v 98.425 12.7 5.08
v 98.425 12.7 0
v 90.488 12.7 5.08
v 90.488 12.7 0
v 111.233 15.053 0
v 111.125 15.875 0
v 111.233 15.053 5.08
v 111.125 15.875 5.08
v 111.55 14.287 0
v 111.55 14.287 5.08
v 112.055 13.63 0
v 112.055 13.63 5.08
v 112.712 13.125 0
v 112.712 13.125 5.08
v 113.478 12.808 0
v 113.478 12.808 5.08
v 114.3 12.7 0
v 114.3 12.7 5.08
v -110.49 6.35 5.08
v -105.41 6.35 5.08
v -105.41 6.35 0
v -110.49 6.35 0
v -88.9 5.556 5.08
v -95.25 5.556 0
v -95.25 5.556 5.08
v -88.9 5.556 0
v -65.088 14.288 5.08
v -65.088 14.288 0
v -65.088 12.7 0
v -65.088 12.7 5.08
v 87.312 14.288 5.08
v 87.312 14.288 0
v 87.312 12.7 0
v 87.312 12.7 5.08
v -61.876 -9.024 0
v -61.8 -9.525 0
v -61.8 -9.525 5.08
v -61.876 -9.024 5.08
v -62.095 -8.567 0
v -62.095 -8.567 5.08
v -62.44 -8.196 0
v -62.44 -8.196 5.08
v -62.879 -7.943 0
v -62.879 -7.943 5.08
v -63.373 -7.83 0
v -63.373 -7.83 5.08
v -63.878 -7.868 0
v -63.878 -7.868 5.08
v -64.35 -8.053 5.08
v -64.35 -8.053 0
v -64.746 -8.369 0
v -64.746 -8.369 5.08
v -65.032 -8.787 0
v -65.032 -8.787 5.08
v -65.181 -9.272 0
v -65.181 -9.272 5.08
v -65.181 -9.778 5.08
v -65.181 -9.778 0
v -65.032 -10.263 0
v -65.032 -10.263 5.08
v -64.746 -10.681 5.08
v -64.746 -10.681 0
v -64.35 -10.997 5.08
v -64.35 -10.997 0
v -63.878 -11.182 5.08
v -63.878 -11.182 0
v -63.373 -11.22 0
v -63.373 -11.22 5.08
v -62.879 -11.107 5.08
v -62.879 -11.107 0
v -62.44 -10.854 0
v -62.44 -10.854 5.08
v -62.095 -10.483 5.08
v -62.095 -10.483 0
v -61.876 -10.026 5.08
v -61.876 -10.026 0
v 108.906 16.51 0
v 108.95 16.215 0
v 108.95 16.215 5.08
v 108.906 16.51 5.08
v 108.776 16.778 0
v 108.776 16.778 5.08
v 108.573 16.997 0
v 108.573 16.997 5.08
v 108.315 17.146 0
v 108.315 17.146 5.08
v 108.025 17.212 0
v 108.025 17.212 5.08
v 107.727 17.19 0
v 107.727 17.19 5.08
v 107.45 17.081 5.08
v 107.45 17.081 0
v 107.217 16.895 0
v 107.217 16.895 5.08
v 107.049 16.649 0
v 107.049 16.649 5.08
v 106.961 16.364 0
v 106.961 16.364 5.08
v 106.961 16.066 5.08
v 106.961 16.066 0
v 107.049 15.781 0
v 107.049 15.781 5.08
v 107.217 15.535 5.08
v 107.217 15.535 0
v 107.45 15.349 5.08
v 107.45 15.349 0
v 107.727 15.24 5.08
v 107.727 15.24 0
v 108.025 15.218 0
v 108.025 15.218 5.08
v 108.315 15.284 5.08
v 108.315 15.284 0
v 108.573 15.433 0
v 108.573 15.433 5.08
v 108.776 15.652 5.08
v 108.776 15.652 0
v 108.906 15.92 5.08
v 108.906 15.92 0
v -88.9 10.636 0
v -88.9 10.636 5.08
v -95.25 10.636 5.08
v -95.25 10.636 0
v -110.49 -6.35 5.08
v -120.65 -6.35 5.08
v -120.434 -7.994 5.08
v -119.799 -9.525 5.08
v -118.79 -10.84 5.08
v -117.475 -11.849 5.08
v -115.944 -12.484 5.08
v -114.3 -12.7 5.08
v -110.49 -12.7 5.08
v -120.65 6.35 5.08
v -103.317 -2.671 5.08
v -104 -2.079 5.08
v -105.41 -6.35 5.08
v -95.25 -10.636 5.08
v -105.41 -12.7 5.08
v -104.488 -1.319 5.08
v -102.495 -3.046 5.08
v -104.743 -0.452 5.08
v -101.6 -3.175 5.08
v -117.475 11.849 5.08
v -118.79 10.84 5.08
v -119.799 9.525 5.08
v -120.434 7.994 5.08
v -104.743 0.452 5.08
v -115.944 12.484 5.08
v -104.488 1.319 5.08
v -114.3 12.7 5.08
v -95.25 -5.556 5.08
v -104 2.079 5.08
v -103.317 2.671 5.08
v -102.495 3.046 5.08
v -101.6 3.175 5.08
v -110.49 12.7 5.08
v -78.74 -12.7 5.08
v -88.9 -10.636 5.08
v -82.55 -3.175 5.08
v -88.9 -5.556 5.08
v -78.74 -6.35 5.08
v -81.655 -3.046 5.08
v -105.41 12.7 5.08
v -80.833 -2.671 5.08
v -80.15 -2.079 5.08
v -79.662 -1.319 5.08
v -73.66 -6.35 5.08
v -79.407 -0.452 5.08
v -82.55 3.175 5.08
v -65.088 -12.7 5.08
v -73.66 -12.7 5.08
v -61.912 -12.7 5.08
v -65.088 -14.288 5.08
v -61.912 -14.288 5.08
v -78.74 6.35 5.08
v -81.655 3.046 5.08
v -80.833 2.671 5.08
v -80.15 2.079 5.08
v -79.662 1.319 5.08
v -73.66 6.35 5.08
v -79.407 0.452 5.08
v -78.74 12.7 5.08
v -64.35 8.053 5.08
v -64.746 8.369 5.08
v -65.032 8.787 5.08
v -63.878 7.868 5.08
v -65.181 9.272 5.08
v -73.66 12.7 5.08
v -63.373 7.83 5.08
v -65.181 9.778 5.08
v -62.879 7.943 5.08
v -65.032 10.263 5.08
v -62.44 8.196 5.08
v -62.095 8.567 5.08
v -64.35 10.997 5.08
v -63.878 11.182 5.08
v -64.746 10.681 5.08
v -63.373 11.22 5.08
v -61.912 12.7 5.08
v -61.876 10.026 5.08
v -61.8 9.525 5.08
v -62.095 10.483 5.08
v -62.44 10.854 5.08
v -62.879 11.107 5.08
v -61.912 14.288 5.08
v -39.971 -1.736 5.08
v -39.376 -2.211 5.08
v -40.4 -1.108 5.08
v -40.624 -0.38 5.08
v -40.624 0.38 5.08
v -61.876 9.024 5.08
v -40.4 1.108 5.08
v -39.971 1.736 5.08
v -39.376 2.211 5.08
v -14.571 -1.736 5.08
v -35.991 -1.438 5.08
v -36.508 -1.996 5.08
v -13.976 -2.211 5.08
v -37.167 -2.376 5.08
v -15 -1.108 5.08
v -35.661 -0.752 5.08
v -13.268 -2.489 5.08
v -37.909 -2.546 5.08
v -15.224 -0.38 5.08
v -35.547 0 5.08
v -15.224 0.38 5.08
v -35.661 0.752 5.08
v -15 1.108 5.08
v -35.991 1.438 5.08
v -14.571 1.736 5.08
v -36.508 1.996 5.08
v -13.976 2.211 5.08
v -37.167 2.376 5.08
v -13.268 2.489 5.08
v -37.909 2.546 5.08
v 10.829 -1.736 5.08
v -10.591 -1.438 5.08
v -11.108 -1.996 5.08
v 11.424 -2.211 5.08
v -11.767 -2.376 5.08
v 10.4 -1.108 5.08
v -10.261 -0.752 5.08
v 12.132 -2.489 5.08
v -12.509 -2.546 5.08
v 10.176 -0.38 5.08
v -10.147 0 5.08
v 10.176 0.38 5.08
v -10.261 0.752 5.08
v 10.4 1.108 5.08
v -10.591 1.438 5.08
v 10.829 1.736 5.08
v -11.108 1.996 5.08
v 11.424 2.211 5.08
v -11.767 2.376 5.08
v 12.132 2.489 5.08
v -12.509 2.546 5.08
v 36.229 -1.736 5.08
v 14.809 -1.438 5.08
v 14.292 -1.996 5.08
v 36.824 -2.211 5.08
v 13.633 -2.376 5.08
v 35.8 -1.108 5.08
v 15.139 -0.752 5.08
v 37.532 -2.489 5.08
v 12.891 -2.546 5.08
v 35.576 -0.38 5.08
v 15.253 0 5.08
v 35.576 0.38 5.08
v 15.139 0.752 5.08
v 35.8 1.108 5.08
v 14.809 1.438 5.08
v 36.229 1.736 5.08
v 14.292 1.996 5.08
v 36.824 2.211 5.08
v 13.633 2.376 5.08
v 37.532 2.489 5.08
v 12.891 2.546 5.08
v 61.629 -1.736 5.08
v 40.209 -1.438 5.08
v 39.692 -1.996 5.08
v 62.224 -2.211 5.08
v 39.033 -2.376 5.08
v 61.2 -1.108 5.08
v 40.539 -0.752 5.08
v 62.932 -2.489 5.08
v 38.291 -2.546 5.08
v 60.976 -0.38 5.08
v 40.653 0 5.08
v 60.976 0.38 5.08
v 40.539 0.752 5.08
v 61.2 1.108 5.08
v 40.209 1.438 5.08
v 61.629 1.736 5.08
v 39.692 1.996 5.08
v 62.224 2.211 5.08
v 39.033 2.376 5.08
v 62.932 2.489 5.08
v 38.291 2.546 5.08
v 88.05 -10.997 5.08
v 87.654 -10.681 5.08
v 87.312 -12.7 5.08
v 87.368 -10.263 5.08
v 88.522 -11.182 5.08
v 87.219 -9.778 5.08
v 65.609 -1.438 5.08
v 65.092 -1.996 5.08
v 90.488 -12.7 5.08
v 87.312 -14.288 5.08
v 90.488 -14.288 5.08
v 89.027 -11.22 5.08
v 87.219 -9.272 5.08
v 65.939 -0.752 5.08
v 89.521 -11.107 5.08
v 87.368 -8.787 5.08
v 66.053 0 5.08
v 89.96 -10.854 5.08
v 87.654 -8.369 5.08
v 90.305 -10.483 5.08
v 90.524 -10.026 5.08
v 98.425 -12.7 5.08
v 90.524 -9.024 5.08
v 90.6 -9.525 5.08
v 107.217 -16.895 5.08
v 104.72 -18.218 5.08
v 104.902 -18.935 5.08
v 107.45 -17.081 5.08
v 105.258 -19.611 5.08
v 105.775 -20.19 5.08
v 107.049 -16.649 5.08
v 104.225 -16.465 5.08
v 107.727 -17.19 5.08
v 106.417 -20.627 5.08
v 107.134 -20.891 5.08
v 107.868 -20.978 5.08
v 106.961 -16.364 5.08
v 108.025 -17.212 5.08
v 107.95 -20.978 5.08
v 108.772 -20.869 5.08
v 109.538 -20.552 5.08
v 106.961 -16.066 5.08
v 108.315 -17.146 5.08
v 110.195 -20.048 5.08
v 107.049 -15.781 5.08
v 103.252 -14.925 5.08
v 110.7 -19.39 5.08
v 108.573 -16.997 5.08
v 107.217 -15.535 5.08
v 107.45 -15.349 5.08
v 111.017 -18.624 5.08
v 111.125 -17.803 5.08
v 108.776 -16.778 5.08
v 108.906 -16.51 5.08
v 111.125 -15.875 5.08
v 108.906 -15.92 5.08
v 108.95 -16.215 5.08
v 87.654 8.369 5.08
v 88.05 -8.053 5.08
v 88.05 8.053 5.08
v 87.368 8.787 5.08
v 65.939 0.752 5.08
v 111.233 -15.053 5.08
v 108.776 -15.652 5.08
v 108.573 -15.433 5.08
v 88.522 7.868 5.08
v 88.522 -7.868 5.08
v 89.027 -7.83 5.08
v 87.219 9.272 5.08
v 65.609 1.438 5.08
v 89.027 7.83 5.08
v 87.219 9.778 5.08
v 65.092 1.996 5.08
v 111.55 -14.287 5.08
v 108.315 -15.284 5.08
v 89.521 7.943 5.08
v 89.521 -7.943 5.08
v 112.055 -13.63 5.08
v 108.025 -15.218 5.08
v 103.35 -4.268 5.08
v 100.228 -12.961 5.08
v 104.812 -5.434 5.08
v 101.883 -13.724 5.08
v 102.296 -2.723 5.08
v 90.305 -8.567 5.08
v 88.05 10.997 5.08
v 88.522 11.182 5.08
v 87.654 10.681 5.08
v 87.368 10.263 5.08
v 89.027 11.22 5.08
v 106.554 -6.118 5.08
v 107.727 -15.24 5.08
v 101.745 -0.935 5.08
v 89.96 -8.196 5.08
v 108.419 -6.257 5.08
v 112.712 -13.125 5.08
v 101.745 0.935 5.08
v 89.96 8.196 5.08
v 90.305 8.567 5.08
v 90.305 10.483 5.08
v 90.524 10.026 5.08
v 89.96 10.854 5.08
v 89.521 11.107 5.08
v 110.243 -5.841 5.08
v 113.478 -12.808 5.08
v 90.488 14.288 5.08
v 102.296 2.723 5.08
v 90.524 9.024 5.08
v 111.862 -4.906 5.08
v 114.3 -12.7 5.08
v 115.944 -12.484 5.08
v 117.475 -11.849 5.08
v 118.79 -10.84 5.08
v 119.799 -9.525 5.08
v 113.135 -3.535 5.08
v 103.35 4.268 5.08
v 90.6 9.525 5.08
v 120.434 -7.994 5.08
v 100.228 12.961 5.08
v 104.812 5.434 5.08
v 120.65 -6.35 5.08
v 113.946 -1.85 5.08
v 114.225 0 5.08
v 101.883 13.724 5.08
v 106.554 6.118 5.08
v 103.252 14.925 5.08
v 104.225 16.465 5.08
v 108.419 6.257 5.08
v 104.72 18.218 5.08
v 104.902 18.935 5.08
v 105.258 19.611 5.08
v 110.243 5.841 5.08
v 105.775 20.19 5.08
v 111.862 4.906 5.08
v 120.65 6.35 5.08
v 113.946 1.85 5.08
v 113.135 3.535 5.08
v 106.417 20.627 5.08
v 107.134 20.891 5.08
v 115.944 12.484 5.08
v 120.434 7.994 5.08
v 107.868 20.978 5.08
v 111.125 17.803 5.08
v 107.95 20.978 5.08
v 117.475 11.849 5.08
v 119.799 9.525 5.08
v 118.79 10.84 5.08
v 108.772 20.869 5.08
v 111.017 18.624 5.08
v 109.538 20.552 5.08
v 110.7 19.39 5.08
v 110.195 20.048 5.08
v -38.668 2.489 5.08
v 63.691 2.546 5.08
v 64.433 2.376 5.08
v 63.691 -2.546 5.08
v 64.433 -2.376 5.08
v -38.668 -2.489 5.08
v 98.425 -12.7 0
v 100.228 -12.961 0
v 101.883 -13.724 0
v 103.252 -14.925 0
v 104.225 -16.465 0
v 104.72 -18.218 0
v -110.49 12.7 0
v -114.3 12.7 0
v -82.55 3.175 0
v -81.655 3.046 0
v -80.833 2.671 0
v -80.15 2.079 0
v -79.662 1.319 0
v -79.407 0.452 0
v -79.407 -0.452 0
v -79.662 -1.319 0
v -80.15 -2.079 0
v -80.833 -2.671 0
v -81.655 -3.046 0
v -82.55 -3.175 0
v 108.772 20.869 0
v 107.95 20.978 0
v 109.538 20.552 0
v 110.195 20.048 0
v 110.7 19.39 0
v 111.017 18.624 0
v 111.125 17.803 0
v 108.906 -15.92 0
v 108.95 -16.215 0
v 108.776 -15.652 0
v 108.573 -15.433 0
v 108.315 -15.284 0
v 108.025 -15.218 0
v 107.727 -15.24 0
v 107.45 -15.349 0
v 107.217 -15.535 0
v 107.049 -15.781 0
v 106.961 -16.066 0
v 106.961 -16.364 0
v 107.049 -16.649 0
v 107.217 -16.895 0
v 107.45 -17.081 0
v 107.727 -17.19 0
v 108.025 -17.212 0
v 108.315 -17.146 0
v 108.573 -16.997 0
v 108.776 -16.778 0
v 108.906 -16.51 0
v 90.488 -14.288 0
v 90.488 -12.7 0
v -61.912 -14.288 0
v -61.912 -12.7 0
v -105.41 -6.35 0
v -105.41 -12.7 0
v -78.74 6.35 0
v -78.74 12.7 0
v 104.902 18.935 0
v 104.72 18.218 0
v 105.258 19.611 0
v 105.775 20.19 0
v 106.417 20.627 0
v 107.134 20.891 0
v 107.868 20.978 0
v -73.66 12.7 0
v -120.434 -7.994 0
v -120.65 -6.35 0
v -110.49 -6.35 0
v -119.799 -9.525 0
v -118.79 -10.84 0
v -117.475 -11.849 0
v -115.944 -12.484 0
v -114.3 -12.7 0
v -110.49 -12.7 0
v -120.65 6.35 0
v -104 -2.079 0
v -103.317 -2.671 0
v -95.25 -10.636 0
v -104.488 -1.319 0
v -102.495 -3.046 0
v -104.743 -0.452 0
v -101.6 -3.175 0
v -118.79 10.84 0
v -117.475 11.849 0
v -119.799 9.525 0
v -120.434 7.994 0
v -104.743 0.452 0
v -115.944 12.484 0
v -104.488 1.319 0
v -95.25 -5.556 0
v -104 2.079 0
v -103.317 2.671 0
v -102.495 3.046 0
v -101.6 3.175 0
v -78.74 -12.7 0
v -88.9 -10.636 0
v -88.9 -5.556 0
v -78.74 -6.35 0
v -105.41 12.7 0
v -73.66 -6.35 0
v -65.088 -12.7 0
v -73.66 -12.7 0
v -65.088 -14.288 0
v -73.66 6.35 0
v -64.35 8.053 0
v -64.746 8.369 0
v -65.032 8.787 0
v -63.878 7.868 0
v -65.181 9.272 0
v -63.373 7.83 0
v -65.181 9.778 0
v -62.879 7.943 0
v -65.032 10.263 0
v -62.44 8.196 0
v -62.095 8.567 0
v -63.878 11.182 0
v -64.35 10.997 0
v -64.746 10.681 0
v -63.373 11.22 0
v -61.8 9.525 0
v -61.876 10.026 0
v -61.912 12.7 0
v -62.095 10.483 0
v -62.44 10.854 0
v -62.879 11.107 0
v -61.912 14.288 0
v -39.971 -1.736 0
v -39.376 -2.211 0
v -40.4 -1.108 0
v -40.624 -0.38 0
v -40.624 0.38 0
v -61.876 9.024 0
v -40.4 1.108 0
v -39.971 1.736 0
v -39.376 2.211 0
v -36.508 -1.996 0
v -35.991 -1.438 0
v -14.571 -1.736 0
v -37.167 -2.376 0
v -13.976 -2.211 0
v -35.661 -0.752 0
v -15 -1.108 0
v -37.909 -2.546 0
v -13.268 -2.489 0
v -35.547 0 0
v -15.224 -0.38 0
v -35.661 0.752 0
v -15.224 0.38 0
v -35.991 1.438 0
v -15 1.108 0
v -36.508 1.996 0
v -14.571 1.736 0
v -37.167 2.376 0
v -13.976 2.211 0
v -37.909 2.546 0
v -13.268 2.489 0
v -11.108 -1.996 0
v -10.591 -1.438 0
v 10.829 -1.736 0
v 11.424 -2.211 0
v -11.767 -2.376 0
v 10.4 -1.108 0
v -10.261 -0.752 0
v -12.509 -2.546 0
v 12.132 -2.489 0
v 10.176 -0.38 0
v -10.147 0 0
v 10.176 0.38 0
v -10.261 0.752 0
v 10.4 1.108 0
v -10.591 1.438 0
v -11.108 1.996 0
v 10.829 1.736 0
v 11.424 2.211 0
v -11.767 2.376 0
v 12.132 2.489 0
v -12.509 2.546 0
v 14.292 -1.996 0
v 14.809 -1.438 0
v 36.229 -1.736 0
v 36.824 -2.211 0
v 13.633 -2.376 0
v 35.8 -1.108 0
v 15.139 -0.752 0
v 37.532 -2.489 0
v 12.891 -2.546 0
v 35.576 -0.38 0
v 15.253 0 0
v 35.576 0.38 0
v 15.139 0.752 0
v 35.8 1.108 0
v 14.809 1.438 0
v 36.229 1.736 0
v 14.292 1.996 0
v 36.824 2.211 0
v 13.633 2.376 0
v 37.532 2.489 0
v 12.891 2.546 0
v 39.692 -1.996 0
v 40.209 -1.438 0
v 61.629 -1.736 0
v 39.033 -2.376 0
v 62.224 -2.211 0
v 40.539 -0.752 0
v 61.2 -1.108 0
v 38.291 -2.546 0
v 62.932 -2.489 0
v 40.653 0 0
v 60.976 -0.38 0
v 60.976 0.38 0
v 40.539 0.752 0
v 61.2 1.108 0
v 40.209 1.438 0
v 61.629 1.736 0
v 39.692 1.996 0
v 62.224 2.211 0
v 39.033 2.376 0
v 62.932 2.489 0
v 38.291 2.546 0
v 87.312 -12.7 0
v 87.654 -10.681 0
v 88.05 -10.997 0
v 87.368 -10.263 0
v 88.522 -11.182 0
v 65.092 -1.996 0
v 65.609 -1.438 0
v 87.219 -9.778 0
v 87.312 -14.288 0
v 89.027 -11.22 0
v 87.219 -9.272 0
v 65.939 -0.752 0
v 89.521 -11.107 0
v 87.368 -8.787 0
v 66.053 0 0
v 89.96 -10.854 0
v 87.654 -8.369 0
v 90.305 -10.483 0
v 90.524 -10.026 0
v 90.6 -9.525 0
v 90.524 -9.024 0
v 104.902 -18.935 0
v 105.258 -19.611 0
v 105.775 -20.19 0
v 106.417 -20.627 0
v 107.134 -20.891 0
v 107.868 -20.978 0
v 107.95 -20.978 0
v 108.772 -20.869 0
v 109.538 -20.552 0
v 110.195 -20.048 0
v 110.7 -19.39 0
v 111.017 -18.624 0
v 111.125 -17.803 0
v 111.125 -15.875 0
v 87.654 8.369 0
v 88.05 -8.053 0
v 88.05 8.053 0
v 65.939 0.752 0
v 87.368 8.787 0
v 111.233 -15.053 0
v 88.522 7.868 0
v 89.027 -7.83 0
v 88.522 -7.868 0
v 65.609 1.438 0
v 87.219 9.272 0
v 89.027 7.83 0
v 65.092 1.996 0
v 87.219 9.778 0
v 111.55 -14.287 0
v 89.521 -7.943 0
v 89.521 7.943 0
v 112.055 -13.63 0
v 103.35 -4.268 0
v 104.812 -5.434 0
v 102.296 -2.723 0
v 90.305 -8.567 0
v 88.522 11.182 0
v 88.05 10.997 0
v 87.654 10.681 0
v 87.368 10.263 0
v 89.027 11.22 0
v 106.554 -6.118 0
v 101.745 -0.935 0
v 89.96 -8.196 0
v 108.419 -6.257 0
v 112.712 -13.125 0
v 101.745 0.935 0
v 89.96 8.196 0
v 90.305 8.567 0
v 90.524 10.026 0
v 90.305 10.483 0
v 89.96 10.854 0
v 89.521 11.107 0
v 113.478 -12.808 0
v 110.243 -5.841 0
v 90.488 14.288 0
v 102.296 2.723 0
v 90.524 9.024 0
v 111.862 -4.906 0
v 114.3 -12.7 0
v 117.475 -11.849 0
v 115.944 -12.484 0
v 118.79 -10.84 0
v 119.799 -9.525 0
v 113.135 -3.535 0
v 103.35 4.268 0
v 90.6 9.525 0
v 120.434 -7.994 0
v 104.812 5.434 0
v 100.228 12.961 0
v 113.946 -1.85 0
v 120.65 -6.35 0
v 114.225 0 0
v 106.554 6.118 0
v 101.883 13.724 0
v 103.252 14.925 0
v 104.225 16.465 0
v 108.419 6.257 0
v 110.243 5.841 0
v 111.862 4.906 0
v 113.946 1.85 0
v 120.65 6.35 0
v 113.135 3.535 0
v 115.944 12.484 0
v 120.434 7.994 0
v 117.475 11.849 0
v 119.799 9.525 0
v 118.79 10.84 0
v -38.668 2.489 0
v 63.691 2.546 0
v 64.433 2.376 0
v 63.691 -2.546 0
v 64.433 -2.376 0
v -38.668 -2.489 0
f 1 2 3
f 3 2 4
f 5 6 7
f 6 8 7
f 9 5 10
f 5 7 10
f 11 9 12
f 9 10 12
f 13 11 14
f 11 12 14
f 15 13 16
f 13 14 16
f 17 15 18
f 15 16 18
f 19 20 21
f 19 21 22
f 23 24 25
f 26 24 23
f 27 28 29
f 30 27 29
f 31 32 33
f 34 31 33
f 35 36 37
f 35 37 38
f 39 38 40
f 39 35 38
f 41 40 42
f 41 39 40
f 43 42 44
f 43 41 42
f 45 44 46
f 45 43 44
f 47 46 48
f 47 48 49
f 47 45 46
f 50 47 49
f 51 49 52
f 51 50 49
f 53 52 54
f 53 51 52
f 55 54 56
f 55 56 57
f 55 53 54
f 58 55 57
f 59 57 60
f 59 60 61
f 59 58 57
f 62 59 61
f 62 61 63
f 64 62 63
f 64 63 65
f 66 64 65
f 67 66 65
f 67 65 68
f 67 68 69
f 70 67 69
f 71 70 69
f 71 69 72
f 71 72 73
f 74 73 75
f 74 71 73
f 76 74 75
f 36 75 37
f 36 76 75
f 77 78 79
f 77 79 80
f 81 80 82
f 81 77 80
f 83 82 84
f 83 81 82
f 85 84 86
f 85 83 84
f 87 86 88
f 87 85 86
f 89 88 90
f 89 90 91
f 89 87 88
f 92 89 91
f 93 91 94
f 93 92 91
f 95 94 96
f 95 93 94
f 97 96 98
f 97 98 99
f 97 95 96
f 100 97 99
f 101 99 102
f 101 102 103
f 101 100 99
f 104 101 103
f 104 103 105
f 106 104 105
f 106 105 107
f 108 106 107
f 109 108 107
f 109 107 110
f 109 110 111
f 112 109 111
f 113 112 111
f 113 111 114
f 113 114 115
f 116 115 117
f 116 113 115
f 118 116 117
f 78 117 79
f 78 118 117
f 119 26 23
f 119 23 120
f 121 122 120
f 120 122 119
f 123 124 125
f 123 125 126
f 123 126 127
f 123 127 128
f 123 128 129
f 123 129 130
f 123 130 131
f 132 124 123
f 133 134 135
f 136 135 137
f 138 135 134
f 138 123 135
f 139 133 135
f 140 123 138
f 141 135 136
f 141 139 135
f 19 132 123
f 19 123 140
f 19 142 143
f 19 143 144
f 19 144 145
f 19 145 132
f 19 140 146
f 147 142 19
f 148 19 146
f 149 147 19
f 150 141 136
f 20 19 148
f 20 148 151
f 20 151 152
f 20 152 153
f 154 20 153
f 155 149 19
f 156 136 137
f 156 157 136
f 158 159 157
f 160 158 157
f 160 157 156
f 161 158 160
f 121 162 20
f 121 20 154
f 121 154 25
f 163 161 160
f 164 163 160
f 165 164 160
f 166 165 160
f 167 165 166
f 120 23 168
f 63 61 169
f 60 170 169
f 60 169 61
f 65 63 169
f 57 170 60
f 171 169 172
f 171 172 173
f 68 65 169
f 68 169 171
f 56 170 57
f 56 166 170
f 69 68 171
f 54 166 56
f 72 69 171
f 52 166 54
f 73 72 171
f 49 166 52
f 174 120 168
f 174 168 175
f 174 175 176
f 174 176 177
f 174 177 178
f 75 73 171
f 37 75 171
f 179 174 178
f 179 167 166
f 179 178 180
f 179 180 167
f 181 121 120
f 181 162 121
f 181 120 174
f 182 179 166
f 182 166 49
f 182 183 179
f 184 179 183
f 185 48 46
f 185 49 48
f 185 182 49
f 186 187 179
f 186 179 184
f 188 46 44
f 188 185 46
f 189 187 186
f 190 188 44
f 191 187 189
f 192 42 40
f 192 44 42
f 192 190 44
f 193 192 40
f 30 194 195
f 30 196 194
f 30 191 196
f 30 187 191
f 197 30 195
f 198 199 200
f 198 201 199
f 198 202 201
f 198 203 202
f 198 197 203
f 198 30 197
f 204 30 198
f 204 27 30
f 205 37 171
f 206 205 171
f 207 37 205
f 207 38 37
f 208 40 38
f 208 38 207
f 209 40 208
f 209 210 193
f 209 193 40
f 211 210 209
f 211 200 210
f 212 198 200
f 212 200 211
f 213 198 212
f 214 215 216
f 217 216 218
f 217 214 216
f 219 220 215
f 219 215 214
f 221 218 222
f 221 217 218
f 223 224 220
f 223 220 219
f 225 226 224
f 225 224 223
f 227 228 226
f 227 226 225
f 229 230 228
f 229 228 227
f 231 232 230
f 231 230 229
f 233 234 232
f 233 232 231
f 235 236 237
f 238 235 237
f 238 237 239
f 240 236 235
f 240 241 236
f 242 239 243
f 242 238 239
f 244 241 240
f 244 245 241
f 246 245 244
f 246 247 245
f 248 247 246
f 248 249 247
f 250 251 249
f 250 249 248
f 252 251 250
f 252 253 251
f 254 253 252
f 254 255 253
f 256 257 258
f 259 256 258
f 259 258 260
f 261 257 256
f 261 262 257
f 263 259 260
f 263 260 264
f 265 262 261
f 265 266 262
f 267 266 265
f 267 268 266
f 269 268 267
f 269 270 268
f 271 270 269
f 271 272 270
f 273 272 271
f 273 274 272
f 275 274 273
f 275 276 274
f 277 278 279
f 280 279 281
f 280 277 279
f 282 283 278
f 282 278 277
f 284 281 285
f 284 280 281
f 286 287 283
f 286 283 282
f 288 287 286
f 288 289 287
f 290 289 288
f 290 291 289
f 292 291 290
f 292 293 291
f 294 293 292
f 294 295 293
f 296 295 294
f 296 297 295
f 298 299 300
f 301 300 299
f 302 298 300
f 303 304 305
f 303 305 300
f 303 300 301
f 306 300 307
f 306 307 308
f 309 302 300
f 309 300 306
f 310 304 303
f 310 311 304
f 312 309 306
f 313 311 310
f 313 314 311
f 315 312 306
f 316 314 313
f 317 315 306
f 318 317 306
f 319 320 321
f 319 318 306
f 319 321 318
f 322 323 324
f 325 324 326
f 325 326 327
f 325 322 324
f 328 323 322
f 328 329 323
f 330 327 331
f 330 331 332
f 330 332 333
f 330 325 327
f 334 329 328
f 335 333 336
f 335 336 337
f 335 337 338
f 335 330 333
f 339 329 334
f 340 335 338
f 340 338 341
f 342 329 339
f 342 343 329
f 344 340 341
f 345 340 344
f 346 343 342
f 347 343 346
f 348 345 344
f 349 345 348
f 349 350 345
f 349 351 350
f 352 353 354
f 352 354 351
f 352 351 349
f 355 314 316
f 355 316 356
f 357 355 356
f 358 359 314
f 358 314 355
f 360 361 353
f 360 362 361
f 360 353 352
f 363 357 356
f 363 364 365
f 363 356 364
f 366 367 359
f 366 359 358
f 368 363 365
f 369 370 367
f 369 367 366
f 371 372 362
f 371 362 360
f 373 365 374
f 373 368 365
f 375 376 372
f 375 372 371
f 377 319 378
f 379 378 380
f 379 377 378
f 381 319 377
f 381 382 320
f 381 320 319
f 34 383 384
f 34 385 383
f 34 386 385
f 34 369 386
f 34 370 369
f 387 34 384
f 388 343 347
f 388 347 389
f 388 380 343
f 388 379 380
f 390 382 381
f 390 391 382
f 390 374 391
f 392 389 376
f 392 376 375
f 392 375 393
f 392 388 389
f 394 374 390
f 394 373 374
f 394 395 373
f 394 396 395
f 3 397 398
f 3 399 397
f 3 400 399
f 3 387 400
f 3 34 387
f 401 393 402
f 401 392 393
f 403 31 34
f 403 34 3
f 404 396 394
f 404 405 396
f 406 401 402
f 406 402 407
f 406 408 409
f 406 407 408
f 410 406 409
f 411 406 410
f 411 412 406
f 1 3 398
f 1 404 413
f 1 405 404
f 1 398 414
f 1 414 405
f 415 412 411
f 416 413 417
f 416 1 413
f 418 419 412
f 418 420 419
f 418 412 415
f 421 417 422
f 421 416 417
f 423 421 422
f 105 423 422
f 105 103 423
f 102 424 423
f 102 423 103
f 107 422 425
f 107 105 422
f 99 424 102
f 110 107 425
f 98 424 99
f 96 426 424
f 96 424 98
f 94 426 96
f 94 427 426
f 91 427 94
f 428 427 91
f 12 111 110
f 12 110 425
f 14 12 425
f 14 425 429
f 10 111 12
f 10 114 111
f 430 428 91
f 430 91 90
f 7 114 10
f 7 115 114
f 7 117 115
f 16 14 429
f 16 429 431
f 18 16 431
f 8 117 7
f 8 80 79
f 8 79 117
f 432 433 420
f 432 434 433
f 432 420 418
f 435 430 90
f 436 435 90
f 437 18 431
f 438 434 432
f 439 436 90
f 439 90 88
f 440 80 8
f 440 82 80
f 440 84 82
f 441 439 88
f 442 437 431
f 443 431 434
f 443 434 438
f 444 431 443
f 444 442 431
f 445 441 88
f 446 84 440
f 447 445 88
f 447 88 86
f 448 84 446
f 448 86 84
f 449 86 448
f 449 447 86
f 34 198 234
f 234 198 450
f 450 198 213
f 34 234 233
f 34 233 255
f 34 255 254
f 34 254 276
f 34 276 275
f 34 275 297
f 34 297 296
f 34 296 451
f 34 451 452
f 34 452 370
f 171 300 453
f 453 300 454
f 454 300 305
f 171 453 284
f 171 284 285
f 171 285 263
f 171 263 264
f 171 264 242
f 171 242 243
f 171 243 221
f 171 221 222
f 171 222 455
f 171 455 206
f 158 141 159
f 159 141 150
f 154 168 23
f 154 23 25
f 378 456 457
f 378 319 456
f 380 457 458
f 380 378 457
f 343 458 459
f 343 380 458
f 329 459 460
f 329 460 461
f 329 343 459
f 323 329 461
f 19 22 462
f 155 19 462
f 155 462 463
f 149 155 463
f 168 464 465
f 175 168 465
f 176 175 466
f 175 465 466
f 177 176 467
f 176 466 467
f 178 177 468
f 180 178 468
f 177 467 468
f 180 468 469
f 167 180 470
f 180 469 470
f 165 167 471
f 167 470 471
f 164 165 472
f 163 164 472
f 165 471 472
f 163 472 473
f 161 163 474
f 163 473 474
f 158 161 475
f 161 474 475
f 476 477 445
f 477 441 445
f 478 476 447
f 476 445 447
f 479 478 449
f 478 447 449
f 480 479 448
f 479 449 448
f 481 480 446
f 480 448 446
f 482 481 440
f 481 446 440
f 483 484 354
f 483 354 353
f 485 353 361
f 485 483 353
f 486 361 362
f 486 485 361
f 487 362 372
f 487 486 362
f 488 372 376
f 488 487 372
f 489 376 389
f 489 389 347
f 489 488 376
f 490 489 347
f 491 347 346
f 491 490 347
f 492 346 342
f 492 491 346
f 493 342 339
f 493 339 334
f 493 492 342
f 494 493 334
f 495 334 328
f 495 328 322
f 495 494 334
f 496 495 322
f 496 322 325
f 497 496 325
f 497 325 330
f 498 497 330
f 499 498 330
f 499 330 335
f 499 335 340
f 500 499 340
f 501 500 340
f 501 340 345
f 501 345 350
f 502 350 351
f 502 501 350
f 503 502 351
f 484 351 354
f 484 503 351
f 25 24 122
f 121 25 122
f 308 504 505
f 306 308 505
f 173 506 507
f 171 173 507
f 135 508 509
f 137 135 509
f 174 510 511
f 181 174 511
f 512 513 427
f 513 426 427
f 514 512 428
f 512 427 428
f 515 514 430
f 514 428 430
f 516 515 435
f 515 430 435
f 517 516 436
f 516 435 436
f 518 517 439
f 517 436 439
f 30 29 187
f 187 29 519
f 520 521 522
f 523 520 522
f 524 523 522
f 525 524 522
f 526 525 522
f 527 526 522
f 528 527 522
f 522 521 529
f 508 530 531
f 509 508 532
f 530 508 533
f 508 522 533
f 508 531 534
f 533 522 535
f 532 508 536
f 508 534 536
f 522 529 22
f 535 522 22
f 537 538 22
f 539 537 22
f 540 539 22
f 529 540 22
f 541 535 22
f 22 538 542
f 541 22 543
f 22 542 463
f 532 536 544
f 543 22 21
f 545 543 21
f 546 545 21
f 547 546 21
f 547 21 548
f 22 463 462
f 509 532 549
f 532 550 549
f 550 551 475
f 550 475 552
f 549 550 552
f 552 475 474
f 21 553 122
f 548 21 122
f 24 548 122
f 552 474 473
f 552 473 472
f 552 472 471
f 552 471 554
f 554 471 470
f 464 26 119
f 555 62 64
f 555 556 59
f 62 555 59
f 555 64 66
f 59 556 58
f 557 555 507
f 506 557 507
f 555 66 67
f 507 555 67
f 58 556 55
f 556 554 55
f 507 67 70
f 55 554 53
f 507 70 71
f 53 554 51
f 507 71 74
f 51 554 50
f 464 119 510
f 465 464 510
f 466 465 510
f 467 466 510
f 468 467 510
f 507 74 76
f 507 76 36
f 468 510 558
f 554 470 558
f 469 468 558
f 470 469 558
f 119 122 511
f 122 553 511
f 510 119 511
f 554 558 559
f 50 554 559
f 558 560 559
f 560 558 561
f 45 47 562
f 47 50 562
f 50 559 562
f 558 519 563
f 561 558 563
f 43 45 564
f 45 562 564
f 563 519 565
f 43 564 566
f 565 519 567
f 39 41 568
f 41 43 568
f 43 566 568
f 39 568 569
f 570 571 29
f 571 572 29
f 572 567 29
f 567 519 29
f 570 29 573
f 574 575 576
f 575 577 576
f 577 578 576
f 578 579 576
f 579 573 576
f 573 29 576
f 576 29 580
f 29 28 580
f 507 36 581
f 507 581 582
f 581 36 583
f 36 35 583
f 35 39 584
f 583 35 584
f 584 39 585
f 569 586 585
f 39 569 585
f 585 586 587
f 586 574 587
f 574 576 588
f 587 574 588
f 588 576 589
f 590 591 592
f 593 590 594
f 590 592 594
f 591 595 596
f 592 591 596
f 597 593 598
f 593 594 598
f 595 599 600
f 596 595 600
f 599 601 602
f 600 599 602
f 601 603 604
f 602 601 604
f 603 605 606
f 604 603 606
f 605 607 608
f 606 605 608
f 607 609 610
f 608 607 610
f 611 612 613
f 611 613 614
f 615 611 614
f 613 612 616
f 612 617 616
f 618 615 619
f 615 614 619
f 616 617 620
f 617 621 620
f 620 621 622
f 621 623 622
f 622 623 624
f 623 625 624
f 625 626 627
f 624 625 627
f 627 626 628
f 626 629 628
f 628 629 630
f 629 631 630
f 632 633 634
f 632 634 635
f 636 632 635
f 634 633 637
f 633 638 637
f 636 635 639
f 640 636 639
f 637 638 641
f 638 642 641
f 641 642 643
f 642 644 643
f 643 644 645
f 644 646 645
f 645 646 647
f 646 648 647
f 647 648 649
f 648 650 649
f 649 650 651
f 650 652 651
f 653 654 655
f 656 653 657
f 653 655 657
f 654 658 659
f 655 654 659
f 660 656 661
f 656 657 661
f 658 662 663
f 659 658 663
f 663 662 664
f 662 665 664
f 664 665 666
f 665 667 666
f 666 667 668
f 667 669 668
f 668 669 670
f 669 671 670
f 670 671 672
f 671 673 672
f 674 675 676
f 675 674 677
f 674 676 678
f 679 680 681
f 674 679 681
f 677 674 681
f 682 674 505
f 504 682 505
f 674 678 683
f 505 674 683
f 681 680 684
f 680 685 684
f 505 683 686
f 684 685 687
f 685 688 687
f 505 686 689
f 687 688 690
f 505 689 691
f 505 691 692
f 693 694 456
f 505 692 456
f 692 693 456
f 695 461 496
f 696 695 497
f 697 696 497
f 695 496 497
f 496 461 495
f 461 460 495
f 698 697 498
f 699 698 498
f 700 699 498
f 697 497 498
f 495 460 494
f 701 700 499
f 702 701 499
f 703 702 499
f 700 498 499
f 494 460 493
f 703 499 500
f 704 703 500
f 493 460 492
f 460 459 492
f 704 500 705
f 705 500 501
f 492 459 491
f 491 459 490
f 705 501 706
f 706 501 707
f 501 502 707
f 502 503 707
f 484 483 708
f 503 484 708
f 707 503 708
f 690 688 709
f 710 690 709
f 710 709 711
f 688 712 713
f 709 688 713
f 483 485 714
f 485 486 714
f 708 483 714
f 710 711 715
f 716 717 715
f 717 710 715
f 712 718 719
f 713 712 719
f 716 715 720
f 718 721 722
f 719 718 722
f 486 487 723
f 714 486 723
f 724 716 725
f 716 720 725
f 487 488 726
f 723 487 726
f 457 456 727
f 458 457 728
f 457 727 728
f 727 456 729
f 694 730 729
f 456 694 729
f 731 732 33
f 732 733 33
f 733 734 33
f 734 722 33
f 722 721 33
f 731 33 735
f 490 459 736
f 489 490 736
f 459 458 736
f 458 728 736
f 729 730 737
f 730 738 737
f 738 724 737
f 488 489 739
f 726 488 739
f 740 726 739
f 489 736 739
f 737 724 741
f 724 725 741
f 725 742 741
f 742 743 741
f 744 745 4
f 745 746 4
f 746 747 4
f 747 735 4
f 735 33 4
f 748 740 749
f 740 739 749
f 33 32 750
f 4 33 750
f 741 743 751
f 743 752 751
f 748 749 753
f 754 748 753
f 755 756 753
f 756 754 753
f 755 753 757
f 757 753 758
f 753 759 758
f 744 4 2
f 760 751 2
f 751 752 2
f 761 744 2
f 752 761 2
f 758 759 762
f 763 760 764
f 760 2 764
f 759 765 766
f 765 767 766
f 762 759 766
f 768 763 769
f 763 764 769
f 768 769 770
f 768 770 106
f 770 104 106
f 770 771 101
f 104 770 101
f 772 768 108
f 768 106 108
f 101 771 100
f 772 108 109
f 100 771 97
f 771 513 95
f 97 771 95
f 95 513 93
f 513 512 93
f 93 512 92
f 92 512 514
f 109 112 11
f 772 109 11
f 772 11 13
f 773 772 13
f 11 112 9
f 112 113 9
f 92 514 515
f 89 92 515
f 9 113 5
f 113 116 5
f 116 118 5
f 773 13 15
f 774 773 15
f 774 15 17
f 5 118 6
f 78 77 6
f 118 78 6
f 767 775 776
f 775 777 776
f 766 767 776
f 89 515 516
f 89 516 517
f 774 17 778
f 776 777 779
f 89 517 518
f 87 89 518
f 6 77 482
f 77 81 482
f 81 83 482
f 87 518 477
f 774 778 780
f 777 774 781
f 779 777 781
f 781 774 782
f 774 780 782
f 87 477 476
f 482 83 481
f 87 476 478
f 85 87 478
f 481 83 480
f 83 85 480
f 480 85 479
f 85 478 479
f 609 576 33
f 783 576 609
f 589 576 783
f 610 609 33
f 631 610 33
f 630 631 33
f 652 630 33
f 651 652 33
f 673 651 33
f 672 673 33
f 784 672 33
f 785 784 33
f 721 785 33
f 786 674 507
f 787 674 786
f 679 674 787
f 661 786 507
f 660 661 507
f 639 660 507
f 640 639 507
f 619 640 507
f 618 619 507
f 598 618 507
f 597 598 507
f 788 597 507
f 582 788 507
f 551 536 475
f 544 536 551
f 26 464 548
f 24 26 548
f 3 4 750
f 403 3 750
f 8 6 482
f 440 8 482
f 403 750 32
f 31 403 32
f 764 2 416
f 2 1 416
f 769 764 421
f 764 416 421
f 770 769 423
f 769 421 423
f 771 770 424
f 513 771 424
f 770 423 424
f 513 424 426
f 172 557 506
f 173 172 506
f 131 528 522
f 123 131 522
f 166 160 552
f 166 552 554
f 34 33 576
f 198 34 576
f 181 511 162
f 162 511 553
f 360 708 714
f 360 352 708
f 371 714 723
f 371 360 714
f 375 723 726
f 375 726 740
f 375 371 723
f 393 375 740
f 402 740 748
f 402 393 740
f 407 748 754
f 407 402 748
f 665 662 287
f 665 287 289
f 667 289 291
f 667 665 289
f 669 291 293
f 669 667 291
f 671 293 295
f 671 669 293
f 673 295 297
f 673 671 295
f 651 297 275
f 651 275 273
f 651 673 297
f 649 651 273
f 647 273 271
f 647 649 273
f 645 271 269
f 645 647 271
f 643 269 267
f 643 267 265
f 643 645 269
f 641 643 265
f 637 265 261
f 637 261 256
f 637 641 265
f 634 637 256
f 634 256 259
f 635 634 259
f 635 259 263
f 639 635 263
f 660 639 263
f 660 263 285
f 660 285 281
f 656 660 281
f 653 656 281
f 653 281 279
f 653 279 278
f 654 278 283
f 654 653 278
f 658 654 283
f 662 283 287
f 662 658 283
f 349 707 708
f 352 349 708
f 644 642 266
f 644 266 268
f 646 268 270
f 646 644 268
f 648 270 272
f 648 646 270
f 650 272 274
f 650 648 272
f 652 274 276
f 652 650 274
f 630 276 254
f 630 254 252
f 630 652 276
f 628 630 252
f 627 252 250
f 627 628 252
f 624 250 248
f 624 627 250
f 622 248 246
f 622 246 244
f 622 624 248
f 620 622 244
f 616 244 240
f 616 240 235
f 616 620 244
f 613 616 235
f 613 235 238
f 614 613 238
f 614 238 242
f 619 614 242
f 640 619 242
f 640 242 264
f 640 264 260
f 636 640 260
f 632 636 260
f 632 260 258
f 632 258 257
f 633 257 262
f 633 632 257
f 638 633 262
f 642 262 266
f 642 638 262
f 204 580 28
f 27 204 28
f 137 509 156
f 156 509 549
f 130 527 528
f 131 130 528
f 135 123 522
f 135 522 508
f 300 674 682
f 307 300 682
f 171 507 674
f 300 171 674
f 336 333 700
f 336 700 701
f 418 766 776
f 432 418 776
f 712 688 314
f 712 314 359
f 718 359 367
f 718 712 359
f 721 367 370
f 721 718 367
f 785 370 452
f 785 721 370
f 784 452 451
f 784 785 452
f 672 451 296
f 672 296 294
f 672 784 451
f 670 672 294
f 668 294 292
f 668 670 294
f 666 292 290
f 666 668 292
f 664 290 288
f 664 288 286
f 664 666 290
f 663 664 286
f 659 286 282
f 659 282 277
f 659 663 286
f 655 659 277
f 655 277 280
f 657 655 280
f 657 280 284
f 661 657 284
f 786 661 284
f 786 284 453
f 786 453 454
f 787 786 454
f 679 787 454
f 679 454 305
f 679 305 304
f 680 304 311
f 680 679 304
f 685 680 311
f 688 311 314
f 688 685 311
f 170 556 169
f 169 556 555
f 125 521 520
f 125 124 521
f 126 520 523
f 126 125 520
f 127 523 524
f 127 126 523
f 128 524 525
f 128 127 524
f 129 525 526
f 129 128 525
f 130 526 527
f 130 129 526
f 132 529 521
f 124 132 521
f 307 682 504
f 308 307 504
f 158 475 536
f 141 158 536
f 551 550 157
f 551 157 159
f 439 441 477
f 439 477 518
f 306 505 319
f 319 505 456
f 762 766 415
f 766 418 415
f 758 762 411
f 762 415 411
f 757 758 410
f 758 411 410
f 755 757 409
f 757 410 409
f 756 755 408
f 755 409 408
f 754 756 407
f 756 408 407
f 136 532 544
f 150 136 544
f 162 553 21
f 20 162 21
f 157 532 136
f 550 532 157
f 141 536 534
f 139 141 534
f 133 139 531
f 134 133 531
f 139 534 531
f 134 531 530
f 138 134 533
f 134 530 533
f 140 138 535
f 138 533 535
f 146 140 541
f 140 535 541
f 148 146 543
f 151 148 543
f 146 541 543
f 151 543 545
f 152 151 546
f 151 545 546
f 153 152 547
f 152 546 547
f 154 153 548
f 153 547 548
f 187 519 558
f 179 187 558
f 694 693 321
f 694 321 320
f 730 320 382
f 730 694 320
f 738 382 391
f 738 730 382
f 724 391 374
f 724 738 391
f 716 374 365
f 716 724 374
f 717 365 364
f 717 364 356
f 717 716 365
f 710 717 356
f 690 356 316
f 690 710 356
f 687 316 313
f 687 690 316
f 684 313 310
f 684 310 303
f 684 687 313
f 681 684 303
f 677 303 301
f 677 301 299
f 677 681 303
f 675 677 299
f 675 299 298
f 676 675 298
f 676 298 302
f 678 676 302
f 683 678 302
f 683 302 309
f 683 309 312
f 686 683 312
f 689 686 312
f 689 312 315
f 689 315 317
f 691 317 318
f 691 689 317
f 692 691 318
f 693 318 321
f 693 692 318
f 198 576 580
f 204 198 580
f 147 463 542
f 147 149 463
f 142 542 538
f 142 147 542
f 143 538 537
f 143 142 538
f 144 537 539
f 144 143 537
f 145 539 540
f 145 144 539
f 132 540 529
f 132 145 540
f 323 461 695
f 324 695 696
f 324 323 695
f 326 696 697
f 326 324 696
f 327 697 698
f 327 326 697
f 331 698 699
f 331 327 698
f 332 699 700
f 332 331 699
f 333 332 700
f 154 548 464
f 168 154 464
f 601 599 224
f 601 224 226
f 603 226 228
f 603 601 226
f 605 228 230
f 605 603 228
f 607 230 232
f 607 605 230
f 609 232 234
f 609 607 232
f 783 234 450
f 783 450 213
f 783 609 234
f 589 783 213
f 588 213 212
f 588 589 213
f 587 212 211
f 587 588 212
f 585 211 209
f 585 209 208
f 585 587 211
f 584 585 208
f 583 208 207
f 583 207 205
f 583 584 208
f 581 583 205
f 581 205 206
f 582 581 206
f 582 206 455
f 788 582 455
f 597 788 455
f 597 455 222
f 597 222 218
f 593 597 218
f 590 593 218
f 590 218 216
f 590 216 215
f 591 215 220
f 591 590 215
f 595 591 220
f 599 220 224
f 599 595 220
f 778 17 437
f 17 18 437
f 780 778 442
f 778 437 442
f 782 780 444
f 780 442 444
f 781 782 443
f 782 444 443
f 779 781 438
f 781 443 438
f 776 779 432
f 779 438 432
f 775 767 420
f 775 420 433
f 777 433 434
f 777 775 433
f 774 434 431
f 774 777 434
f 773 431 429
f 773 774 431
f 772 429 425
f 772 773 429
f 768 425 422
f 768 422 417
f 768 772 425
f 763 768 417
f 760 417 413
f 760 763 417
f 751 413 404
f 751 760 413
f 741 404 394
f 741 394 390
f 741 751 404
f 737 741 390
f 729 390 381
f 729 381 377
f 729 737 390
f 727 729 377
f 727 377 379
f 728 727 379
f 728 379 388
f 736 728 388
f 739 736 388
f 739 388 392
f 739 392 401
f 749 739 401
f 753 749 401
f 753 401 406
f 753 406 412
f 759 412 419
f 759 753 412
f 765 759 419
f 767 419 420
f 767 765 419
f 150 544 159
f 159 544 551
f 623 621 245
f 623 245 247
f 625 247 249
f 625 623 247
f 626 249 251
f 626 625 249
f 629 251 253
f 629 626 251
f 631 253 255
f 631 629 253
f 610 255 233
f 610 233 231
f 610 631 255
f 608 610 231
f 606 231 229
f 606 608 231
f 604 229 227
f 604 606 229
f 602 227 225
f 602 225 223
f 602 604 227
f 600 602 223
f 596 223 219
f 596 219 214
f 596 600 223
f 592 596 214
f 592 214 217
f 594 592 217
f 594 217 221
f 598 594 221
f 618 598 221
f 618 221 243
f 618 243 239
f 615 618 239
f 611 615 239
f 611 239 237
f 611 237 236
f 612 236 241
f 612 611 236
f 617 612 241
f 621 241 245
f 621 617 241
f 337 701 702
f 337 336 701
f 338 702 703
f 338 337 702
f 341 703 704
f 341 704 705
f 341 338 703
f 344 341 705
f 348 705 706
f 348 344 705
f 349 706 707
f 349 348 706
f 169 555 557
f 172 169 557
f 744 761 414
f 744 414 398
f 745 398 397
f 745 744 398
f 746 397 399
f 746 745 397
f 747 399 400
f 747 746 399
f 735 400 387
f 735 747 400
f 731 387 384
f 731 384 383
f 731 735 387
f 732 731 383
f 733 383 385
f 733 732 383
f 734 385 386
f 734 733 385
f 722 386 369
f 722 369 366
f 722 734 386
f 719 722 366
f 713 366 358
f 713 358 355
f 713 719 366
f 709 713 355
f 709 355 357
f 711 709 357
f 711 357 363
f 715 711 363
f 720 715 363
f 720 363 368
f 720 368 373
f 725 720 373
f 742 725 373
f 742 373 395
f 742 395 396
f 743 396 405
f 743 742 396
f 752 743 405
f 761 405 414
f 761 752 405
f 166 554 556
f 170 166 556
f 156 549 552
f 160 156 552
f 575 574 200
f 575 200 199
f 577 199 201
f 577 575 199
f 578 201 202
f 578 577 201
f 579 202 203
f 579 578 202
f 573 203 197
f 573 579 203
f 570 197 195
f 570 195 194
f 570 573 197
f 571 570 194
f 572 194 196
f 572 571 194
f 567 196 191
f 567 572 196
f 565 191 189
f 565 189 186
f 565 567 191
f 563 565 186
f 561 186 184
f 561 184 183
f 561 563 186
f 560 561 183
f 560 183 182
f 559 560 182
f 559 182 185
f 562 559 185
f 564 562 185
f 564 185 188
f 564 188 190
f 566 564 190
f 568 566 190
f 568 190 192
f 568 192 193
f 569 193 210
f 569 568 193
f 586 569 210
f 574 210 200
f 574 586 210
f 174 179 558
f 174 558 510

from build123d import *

# Parameters (mm, degrees)
SKETCH2_W           = 6.35
SKETCH2_H           = 5.08
SKETCH2_R           = 1.7
SKETCH2_R_2         = 2.5527
SKETCH2_R_3         = 1
SKETCH2_R_4         = 6.275
BOSS_EXTRUDE1_DEPTH = 5.08
FILLET1_R           = 6.35
FILLET2_R           = 3.175


with BuildPart() as part:
    # Sketch2 → Boss-Extrude1 (new body)
    with BuildSketch(Plane.XY):
        Polygon((-110.49, 12.7), (-120.65, 12.7), (-120.65, -12.7), (-110.49, -12.7), (-110.49, -6.35), (-105.41, -6.35), (-105.41, -12.7), (-78.74, -12.7), (-78.74, -6.35), (-73.66, -6.35), (-73.66, -12.7), (-65.0875, -12.7), (-65.0875, -14.2875), (-61.9125, -14.2875), (-61.9125, -12.7), (87.3125, -12.7), (87.3125, -14.2875), (90.4875, -14.2875), (90.4875, -12.7), (104.775, -12.7), (104.775, -20.9775), (111.125, -20.9775), (111.125, -12.7), (120.65, -12.7), (120.65, 12.7), (111.125, 12.7), (111.125, 20.9775), (104.775, 20.9775), (104.775, 12.7), (90.4875, 12.7), (90.4875, 14.2875), (87.3125, 14.2875), (87.3125, 12.7), (-61.9125, 12.7), (-61.9125, 14.2875), (-65.0875, 14.2875), (-65.0875, 12.7), (-73.66, 12.7), (-73.66, 6.35), (-78.74, 6.35), (-78.74, 12.7), (-105.41, 12.7), (-105.41, 6.35), (-110.49, 6.35), align=None)
        with Locations((-92.075, -8.09625)):
            Rectangle(SKETCH2_W, SKETCH2_H, mode=Mode.SUBTRACT)
        with Locations((-63.5, -9.525)):
            Circle(SKETCH2_R, mode=Mode.SUBTRACT)
        with BuildLine():
            ThreePointArc((-101.6, -3.175), (-104.775, 0), (-101.6, 3.175))
            Line((-101.6, 3.175), (-82.55, 3.175))
            ThreePointArc((-82.55, 3.175), (-79.375, 0), (-82.55, -3.175))
            Line((-82.55, -3.175), (-101.6, -3.175))
        make_face(mode=Mode.SUBTRACT)
        with Locations((-38.1, 0)):
            Circle(SKETCH2_R_2, mode=Mode.SUBTRACT)
        with Locations((-12.7, 0)):
            Circle(SKETCH2_R_2, mode=Mode.SUBTRACT)
        with Locations((107.95, -16.215)):
            Circle(SKETCH2_R_3, mode=Mode.SUBTRACT)
        with Locations((12.7, 0)):
            Circle(SKETCH2_R_2, mode=Mode.SUBTRACT)
        with Locations((38.1, 0)):
            Circle(SKETCH2_R_2, mode=Mode.SUBTRACT)
        with Locations((88.9, -9.525)):
            Circle(SKETCH2_R, mode=Mode.SUBTRACT)
        with Locations((63.5, 0)):
            Circle(SKETCH2_R_2, mode=Mode.SUBTRACT)
        with Locations((107.95, 0)):
            Circle(SKETCH2_R_4, mode=Mode.SUBTRACT)
        with Locations((-92.075, 8.09625)):
            Rectangle(SKETCH2_W, SKETCH2_H, mode=Mode.SUBTRACT)
        with Locations((-63.5, 9.525)):
            Circle(SKETCH2_R, mode=Mode.SUBTRACT)
        with Locations((88.9, 9.525)):
            Circle(SKETCH2_R, mode=Mode.SUBTRACT)
        with Locations((107.95, 16.215)):
            Circle(SKETCH2_R_3, mode=Mode.SUBTRACT)
    extrude(amount=BOSS_EXTRUDE1_DEPTH)

    # Fillet1
    fillet1_edges = [part.edges().sort_by_distance(p)[0] for p in [
        (104.775, 12.7, 2.54),
        (120.65, 12.7, 2.54),
        (120.65, -12.7, 2.54),
        (104.775, -12.7, 2.54),
        (-120.65, -12.7, 2.54),
        (-120.65, 12.7, 2.54),
    ]]
    fillet(fillet1_edges, radius=FILLET1_R)

    # Fillet2
    fillet2_edges = [part.edges().sort_by_distance(p)[0] for p in [
        (104.775, -20.9775, 2.54),
        (111.125, -20.9775, 2.54),
        (111.125, -12.7, 2.54),
        (111.125, 12.7, 2.54),
        (111.125, 20.9775, 2.54),
        (104.775, 20.9775, 2.54),
    ]]
    fillet(fillet2_edges, radius=FILLET2_R - 0.0001)  # a hair under: the kernel refuses the full size


solid = part.part
